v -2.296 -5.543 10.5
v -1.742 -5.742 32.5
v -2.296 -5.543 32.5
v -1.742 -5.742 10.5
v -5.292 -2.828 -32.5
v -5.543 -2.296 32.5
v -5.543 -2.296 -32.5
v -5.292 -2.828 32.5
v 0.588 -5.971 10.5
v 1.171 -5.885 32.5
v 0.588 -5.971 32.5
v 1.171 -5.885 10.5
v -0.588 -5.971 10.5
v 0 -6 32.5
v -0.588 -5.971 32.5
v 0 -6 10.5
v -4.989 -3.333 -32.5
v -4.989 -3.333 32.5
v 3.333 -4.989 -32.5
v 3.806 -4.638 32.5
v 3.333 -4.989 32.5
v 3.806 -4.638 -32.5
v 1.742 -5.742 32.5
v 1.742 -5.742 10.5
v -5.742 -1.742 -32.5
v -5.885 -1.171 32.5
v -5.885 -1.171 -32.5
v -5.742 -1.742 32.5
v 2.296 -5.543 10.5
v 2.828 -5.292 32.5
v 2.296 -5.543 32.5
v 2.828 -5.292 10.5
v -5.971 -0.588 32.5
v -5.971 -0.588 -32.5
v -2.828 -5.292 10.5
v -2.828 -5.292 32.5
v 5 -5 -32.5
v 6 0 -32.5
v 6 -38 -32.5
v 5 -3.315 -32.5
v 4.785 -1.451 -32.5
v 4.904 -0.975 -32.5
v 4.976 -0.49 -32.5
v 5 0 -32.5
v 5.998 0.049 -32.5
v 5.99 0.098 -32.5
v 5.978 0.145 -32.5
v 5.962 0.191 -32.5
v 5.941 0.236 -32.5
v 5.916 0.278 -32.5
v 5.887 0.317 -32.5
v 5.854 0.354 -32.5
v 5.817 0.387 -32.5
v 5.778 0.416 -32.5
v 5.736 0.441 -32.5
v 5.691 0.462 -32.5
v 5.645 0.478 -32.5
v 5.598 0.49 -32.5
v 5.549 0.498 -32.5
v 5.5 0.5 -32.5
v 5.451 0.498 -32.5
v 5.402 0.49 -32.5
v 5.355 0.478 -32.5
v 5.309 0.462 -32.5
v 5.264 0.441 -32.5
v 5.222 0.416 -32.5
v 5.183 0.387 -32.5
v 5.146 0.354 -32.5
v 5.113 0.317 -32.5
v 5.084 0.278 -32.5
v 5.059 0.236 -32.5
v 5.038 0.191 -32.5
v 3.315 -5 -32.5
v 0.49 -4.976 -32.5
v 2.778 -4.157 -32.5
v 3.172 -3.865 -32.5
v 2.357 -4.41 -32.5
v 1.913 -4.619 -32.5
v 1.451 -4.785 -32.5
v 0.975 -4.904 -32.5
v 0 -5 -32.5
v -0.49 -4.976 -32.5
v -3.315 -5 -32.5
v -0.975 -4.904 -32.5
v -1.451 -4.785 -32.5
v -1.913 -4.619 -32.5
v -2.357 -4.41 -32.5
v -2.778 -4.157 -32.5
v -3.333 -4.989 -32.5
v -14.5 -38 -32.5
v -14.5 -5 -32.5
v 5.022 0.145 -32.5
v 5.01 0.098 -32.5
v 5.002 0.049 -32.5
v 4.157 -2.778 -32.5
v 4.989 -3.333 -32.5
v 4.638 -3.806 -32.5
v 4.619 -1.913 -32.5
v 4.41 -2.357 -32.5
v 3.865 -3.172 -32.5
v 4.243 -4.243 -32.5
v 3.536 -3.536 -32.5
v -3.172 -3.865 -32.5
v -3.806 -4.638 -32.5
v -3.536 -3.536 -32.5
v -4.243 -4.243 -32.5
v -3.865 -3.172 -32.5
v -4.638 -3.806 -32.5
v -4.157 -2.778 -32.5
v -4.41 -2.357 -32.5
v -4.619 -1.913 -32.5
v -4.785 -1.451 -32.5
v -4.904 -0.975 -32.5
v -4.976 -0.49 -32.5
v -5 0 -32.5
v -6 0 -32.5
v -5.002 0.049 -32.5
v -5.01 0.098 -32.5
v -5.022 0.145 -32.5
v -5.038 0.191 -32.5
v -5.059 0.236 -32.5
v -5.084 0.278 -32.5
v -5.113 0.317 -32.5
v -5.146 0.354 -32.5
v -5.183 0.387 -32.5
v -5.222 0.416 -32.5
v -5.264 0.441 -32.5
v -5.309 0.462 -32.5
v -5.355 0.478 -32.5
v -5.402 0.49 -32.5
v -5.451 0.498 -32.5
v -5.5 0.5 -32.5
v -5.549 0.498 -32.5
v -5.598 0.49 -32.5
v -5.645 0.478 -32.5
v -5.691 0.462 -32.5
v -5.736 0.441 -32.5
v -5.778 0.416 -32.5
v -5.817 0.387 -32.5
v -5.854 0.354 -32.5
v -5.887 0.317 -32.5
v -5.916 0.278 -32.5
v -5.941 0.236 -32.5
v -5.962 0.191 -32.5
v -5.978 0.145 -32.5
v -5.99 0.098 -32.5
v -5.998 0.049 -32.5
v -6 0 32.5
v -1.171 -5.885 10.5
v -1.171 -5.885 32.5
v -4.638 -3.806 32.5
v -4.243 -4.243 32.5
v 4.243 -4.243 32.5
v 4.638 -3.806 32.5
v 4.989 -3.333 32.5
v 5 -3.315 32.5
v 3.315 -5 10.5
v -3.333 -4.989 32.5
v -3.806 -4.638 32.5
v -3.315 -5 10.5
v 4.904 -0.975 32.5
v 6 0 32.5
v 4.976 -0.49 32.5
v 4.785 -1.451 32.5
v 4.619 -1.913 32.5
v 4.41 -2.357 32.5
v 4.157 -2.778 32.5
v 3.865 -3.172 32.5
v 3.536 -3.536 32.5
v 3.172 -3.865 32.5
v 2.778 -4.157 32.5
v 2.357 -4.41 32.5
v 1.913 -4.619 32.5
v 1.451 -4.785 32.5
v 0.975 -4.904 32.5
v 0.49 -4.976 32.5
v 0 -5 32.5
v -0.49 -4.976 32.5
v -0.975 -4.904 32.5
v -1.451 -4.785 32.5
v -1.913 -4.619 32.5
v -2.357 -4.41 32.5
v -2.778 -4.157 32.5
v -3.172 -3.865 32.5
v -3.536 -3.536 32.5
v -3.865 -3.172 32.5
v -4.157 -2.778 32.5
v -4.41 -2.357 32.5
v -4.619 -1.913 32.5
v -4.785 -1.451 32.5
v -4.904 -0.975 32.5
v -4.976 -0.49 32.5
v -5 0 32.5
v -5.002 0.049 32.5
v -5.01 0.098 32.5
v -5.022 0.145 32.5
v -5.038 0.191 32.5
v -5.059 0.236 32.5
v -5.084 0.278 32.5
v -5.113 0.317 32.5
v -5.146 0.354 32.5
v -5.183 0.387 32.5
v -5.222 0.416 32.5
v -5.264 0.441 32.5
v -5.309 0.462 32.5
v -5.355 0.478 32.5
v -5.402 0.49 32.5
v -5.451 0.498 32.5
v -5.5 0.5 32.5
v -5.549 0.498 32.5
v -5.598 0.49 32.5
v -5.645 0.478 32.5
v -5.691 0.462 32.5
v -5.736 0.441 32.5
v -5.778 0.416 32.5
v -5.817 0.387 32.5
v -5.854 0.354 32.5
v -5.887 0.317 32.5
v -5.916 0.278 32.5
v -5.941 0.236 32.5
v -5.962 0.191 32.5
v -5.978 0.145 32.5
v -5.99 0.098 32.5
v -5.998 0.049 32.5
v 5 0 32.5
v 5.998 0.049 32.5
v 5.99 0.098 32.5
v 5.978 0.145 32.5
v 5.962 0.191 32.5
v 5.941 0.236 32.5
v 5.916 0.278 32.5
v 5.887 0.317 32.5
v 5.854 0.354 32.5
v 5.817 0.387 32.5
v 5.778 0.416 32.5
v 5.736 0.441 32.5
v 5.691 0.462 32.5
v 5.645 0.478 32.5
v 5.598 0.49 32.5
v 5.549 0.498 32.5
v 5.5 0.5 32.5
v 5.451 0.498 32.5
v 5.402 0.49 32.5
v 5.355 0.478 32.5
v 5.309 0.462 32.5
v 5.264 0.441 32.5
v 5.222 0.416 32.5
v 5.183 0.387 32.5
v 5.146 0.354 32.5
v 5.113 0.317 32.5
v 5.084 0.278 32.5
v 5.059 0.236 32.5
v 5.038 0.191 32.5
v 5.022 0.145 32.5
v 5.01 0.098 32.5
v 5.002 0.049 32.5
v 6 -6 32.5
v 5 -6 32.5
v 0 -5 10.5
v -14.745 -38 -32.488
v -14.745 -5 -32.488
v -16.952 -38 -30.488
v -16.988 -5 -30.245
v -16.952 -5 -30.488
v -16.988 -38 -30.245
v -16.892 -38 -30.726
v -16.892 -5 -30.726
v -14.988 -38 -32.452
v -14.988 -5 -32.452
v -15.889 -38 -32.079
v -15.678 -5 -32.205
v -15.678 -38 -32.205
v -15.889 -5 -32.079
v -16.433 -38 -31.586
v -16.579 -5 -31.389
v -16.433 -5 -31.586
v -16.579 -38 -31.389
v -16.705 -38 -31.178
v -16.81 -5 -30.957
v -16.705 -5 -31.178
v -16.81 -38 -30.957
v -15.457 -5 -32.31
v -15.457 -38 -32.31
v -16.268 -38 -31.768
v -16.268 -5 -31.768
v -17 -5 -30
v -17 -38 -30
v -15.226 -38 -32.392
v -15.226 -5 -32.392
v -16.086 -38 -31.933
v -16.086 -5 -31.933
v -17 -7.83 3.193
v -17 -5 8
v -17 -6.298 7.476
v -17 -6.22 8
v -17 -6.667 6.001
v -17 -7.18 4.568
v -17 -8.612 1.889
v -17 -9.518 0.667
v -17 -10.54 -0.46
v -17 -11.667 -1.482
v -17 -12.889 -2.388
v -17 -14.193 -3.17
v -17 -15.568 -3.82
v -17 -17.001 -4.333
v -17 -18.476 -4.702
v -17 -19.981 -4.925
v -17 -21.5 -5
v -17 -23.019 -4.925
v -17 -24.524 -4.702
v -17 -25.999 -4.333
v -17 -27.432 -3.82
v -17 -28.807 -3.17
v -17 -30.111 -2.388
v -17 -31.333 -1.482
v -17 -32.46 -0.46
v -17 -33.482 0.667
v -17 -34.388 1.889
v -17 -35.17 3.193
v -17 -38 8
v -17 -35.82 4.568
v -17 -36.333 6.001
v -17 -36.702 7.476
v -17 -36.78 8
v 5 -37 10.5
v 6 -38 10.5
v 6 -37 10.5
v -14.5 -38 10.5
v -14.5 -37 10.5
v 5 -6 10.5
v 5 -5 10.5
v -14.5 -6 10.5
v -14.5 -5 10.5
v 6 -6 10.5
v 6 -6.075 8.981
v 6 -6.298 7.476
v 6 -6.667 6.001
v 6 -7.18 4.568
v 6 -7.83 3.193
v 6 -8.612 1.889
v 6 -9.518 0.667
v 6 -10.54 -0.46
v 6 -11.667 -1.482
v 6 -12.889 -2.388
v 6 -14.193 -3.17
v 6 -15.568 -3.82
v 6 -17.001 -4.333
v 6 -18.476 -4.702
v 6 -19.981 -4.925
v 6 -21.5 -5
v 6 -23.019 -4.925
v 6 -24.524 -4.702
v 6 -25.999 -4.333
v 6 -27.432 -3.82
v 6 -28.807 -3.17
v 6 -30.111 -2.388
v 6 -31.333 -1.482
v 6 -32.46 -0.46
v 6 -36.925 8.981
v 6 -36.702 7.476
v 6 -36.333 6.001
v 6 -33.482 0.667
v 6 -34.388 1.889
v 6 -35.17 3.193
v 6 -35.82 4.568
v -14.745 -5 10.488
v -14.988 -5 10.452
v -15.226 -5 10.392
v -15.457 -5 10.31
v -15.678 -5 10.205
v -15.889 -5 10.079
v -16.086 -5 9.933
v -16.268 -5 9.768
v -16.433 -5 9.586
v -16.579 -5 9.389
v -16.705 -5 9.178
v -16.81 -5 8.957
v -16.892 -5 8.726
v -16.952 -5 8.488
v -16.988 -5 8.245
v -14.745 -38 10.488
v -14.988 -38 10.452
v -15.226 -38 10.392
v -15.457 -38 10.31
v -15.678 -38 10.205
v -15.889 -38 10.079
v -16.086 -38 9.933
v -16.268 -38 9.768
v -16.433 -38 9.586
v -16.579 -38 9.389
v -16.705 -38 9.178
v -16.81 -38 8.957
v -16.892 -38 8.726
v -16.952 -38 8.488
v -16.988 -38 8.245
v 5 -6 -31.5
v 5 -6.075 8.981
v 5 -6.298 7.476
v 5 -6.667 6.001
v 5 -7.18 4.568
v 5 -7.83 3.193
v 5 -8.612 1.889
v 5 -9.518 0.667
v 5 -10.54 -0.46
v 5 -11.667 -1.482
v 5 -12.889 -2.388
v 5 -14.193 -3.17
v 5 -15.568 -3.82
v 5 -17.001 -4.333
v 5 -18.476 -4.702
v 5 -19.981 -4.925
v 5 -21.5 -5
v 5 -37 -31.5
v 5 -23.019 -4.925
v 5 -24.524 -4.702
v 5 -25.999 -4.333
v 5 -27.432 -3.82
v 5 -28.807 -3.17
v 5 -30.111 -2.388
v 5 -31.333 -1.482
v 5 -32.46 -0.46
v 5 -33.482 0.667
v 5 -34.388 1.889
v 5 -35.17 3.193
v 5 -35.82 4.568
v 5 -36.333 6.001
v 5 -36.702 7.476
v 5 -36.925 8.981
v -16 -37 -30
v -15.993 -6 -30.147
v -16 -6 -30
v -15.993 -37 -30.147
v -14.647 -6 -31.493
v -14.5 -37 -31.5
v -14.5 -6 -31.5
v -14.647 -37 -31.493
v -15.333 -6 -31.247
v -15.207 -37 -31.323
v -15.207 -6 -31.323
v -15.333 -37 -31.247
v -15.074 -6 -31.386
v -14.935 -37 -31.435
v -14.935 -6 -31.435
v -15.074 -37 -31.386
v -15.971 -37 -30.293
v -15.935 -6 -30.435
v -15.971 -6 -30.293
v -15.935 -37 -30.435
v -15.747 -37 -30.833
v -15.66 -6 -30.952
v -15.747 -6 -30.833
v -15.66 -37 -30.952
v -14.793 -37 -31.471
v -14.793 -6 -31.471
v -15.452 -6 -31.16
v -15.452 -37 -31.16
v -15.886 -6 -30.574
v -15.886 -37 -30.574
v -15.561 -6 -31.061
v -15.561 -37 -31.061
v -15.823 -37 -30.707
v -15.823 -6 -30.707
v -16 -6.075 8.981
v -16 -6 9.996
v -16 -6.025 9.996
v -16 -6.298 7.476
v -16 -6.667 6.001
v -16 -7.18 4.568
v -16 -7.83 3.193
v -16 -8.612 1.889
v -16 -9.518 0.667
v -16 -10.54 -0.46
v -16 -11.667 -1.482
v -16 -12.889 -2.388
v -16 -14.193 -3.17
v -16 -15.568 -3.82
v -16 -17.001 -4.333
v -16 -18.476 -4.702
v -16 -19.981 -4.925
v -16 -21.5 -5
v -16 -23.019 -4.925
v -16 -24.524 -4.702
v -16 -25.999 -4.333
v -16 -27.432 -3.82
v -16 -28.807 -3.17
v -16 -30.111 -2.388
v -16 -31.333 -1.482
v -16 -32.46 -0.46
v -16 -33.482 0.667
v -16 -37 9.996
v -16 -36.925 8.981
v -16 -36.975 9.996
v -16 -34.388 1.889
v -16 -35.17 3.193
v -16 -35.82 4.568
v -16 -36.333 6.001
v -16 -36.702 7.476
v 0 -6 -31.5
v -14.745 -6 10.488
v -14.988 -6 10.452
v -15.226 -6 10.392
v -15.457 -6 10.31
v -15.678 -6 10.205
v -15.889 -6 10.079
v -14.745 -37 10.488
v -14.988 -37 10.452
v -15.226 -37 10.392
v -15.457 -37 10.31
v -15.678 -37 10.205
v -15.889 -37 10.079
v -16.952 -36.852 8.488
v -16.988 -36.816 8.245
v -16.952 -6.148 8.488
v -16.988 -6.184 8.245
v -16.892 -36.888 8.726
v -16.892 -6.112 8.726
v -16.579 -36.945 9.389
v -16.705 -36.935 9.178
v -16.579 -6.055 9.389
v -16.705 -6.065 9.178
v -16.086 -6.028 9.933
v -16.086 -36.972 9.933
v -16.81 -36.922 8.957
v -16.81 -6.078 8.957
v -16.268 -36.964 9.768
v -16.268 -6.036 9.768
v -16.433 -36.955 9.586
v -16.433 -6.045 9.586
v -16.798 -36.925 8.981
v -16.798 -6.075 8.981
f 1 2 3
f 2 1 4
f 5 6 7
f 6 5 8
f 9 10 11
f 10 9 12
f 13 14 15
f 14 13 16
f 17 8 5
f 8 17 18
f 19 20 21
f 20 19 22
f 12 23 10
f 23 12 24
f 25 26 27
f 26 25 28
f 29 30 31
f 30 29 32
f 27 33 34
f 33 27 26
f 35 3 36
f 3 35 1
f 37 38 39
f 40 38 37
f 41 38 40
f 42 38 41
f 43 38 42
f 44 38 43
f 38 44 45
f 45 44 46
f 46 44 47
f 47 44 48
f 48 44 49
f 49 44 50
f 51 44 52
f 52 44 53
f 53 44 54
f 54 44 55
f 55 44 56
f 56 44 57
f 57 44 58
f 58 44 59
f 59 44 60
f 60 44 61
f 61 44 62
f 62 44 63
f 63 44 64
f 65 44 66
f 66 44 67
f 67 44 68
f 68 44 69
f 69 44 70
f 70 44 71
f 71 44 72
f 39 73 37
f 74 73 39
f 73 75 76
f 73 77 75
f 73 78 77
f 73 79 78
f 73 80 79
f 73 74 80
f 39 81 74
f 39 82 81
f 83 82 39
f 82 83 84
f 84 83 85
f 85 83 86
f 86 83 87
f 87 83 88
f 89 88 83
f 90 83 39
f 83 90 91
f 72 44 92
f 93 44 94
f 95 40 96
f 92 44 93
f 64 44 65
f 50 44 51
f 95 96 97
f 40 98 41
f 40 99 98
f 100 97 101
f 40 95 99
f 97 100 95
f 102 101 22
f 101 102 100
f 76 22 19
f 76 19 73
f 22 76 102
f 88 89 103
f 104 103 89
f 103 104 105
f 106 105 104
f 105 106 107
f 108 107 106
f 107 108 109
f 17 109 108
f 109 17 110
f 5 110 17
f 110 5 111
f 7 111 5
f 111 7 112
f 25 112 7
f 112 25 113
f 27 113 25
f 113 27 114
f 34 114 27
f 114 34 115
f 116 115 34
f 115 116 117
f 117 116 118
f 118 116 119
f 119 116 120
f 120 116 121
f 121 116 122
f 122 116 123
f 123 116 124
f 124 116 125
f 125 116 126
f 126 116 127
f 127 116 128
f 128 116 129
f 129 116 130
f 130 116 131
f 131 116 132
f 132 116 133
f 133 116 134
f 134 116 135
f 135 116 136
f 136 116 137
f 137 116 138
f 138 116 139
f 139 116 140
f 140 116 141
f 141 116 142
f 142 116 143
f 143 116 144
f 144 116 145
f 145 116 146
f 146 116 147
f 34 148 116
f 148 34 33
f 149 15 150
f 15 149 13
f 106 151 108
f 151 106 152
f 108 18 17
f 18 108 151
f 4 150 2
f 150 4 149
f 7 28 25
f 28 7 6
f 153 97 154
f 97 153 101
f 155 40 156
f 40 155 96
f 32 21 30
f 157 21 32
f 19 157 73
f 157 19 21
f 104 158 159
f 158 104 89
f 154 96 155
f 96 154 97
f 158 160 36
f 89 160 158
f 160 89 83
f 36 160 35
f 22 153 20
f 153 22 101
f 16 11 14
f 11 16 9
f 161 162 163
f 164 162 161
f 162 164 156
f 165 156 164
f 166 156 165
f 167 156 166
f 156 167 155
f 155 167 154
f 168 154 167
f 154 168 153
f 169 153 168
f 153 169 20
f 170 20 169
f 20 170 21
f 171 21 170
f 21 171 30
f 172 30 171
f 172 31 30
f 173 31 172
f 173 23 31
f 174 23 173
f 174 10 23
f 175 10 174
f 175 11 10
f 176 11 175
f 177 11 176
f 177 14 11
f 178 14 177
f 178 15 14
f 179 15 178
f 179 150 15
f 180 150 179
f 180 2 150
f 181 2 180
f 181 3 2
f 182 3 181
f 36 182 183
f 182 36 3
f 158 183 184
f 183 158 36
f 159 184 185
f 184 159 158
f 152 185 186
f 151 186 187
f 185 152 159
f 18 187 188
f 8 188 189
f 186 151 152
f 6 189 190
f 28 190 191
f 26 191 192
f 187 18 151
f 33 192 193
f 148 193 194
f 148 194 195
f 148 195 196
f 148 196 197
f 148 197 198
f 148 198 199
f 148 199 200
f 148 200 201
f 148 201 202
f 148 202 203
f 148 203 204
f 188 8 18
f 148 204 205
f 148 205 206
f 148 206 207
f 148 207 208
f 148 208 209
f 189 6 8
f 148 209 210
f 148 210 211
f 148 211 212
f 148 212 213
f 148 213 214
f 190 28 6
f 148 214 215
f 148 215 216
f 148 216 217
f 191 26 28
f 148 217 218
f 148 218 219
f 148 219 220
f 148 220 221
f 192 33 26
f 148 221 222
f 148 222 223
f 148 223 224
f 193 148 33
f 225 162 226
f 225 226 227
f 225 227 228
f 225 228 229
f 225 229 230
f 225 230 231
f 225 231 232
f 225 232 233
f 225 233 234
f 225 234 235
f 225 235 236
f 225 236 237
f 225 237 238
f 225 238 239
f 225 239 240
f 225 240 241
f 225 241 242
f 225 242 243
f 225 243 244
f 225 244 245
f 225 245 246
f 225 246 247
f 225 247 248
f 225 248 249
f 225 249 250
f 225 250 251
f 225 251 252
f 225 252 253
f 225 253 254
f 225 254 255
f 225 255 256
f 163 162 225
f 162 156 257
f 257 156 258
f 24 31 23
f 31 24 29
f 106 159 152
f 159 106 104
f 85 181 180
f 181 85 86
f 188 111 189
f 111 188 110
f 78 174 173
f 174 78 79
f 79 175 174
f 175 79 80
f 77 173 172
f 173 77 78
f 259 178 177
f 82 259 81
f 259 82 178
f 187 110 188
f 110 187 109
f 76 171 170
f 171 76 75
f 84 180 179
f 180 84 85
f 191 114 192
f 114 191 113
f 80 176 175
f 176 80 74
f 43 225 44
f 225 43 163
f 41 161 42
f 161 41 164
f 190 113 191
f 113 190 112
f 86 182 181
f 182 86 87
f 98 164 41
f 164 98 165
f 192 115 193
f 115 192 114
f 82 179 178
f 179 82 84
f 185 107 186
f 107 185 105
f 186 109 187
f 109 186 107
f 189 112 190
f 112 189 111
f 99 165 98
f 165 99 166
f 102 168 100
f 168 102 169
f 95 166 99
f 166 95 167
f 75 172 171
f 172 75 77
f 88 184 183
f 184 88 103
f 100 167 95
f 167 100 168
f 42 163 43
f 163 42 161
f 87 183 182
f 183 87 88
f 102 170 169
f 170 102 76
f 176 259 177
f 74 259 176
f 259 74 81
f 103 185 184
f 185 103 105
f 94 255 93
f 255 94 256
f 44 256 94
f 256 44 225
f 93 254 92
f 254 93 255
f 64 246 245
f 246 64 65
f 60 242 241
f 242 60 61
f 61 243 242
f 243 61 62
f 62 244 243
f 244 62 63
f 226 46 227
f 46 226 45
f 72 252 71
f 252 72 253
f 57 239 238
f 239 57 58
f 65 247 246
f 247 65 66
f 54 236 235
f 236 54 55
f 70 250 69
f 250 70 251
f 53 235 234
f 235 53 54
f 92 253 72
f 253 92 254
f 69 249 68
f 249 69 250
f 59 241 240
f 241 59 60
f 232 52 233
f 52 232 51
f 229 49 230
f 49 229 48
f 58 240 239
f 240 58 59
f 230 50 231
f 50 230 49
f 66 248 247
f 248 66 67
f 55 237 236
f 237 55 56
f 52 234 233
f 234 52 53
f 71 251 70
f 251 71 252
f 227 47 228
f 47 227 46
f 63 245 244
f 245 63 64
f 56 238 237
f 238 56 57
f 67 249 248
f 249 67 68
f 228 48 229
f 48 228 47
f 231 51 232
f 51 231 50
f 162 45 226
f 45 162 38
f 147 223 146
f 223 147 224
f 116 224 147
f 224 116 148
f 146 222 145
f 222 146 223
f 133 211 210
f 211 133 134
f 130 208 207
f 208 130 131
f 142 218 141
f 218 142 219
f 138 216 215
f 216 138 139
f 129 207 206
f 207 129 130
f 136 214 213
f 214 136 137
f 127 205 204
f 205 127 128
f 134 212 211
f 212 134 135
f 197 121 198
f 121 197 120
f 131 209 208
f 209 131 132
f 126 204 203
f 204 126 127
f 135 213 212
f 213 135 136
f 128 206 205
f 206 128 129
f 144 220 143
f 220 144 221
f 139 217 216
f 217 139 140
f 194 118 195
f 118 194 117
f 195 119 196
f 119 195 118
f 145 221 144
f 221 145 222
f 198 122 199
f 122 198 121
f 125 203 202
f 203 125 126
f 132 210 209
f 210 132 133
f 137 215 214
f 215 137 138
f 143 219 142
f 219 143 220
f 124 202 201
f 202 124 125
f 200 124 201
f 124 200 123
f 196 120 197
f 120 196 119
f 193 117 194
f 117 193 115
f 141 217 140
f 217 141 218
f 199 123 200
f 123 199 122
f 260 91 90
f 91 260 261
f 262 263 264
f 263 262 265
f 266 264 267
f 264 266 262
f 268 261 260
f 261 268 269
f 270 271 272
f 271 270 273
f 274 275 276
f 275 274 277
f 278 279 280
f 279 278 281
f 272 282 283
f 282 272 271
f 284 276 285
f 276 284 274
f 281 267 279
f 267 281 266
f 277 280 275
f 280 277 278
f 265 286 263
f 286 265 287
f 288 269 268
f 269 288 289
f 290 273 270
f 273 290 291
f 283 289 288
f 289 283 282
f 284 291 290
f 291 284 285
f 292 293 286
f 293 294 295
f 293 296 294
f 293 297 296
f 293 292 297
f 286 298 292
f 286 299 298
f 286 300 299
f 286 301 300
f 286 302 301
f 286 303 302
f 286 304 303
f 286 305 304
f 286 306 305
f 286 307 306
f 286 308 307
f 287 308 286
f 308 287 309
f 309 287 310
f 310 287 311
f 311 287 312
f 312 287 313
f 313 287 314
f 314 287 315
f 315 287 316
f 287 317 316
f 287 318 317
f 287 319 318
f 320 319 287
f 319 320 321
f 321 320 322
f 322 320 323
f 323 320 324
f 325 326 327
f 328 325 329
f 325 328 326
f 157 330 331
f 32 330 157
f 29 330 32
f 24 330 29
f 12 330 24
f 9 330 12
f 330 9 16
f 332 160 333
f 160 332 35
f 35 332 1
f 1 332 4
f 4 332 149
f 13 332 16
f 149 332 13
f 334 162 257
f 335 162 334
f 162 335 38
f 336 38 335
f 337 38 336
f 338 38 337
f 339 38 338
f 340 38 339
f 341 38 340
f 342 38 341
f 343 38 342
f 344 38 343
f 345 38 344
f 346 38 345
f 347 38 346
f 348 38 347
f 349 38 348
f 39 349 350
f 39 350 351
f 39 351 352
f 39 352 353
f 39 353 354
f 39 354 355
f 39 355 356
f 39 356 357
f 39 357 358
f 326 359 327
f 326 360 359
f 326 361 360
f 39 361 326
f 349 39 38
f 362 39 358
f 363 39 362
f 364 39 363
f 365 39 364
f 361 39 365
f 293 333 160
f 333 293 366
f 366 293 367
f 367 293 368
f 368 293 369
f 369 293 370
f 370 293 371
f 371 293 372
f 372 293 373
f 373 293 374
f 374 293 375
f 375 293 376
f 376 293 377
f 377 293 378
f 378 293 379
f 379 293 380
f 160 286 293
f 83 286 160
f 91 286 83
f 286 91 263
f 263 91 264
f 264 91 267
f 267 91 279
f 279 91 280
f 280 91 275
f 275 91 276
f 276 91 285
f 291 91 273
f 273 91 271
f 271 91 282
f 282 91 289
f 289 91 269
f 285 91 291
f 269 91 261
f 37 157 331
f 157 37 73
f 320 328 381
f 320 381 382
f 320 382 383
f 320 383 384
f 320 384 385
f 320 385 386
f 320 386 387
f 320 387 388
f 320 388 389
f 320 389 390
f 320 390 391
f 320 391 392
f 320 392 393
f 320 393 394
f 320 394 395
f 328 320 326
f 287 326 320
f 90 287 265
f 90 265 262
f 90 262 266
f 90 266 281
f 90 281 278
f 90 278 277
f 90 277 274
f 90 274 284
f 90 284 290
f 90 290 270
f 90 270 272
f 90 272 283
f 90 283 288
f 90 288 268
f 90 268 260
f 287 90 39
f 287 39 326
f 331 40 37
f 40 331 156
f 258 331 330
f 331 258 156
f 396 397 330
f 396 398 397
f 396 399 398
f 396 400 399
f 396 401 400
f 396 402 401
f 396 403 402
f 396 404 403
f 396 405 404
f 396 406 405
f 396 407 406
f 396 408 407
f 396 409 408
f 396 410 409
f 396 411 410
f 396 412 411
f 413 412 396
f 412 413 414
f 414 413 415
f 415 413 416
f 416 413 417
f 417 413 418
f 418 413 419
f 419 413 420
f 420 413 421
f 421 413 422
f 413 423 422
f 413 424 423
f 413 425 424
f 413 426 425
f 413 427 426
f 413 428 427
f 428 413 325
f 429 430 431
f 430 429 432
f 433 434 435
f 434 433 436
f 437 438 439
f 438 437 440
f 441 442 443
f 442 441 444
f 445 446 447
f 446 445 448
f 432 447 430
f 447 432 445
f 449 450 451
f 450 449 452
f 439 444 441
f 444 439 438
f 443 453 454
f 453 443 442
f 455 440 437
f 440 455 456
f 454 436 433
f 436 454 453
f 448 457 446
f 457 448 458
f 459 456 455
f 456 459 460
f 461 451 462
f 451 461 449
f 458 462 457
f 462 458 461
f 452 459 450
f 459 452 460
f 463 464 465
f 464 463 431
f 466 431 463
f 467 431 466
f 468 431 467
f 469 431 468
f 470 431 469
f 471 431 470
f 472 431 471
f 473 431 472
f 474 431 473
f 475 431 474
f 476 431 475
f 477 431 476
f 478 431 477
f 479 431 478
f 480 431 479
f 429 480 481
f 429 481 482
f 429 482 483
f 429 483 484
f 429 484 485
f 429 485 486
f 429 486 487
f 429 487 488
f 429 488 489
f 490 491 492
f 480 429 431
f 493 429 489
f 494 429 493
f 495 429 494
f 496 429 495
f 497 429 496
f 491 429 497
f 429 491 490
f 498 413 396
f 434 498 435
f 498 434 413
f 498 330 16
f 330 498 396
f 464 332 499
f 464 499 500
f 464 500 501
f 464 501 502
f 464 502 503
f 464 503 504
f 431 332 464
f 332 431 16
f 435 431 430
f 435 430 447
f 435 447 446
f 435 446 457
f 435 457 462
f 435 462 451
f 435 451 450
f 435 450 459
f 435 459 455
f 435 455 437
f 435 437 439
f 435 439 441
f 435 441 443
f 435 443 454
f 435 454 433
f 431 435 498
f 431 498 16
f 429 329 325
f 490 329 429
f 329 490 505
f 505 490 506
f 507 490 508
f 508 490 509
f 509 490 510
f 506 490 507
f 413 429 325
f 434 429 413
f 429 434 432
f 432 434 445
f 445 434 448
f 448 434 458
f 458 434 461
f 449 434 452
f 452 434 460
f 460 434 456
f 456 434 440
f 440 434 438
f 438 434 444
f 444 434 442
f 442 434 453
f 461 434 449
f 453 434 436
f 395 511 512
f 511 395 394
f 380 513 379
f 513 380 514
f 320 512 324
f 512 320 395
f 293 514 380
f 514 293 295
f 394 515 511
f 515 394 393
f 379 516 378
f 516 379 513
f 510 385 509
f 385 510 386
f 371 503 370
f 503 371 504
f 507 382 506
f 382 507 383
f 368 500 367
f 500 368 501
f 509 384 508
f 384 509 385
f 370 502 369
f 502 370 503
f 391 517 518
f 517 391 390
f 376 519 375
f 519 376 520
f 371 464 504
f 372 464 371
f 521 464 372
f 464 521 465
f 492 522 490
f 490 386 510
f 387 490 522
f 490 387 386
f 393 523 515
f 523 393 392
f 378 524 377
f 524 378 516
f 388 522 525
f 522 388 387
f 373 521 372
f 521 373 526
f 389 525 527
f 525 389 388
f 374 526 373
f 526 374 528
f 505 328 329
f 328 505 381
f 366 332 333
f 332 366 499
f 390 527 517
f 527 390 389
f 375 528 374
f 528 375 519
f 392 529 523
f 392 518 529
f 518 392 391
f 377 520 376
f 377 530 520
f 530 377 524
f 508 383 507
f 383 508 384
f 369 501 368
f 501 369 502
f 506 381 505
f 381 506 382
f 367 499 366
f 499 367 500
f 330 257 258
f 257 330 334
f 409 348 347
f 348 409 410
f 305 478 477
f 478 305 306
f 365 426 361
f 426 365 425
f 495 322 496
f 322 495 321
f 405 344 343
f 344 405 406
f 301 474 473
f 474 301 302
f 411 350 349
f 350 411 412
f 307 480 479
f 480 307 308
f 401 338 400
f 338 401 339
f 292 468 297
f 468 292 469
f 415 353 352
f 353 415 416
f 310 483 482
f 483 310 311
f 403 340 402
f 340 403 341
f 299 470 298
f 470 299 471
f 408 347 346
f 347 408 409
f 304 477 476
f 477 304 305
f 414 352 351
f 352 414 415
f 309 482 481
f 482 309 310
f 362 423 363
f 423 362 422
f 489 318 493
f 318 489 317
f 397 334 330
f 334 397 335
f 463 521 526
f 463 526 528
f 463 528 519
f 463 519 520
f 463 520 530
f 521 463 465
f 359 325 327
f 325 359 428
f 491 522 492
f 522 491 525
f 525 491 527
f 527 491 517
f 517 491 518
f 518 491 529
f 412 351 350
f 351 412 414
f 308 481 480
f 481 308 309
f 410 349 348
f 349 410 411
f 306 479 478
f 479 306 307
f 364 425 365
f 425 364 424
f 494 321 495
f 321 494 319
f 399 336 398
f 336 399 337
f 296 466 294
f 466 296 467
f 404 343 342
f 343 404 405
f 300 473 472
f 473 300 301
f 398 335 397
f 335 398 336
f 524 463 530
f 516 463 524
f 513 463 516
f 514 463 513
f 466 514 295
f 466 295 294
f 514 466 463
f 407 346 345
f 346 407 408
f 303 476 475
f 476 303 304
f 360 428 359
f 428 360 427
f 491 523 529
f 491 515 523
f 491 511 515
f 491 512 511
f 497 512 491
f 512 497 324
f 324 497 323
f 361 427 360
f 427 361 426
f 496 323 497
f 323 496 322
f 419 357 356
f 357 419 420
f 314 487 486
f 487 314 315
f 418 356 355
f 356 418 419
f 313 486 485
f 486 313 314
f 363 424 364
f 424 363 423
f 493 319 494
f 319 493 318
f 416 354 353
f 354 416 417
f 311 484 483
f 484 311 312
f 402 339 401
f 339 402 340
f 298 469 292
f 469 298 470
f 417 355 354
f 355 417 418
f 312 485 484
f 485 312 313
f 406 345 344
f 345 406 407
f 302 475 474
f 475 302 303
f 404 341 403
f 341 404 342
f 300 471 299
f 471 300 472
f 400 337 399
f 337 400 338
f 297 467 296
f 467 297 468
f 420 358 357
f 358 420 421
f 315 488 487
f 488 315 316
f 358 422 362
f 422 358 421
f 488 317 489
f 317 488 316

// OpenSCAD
//set the type of holder
OpenTo="right"; //["left":left side open, "right":right side open, "cut_for_debug":cut out to see the inside]

//Chalk radius in mm
chalk_r=4.5;

//Chalk holder length in mm
chalk_l=65;

//sponge width in mm
sponge_w=40;

//sponge height in mm
sponge_h=30;

//sponge thickness in mm
sponge_th=20;

//Wall thickness in mm
wall=1;

/* [Hidden] */

$fn=64;

wiggle=.5;
flatlen=15;//for tesa powerstrips
holder_in_r=chalk_r+wiggle;
holder_out_r=chalk_r+wall+wiggle;

edge_cutoff=wall*5;

/*
Chalk and sponge holder
Version 9, February 2015
Written by MC Geisler (mcgenki at gmail dot com)

A convenient storage for your blackboard accessories.

Have fun!

License: Attribution 4.0 International (CC BY 4.0)

You are free to:
    Share - copy and redistribute the material in any medium or format
    Adapt - remix, transform, and build upon the material
    for any purpose, even commercially.
*/

module half_pipe()
{
    //half pipe
    difference()
    {
        cylinder(r=holder_out_r,h=chalk_l,center=true); 
        cylinder(r=holder_in_r,h=chalk_l*2,center=true);
        translate([0,chalk_l/2,0])
            cube([chalk_l,chalk_l,chalk_l+2],center=true);
    }

    //stabilize the half pipe
    //translate([-chalk_r-wiggle-wall/2,-flatlen/2,0])
    //    cube([wall,flatlen,chalk_l],center=true);

    //half pipe edges rounded
    edge_pos=chalk_r+wiggle+wall/2;
    translate([-edge_pos,0,0])
        cylinder(r=wall/2,h=chalk_l,center=true);
    translate([edge_pos,0,0])
        cylinder(r=wall/2,h=chalk_l,center=true);
}
            
module box_rounded(a,b,c,edge_cutoff)
{
    difference()
    {
        cube([a,b,c],center=true);

        translate([a/2,0,-c/2])
            difference()
            {
                cube([edge_cutoff,b*2,edge_cutoff],center=true);
                
                translate([-edge_cutoff/2,0,edge_cutoff/2])
                    rotate([90,0,0])
                        cylinder(r=edge_cutoff/2,h=b*2,center=true);
            }
   }
}

module sponge_box()
{       
    outer_th=sponge_th+2*(wall+wiggle);
    outer_h=sponge_h+2*(wall+wiggle);
    outer_w=sponge_w+2*(wall+wiggle);
    
    //sponge box
    translate([     outer_th/2-holder_out_r,
                    -outer_h/2-holder_out_r+wall,
                    outer_w/2-chalk_l/2      ])
        difference()
        {
            union()
            {
                //outer cube
                box_rounded(outer_th,outer_h,outer_w,edge_cutoff);
                                
                //stabilize the half pipe with a wall adder
                translate([-sponge_th/2-wiggle-wall/2,
                        -flatlen/2+sponge_h/2+wiggle+holder_out_r,
                        -(sponge_w+2*(wall+wiggle))/2+chalk_l/2 ])
                    cube([wall,flatlen,chalk_l],center=true);
            }

            //cut out sponge
            translate([0,0,sponge_w/2])
                box_rounded(sponge_th+2*wiggle,sponge_h+2*wiggle,sponge_w+2*wiggle+sponge_w,edge_cutoff-wall*2);
            
           //cut out the stabilizer
           translate([0,0,sponge_w/2+sponge_w+wiggle*2+wall])
                cube([sponge_th*2,sponge_h+2*wiggle,sponge_w+2*wiggle+sponge_w],center=true);
            
            //cut out for the fingers
            translate([0,0,sponge_w/2+(wall+wiggle)])
                rotate([0,90,0])
                    cylinder(r=(sponge_h+2*wiggle)/2,h=sponge_th*2,center=true);

            //cut off side edges to be safer
            translate([outer_th/2,outer_h/2*0,outer_w/2])
                difference()
                {
                    cube([edge_cutoff,sponge_h*2,edge_cutoff],center=true);
                    translate([-edge_cutoff/2,0,-edge_cutoff/2])
                        rotate([90,0,0])
                            cylinder(r=edge_cutoff/2,h=sponge_h*2,center=true);
                }
               
        }
}                                 

module holder()
{
    half_pipe();
    sponge_box();
}

if (OpenTo=="left")
{
    holder();
}
else
{
    if (OpenTo=="right")
    {
        rotate([0,180,0])
            mirror([0,0,1])
            {
                holder();
            }
    }
    else
    {
        if (OpenTo=="cut_for_debug")
        {
            rotate([0,180,0])
                mirror([0,0,1])
                {
                    difference()
                    {
                        holder();
                        translate([0,-25,-50]) cube(30);
                    }
                }
        }        
    }  
}
